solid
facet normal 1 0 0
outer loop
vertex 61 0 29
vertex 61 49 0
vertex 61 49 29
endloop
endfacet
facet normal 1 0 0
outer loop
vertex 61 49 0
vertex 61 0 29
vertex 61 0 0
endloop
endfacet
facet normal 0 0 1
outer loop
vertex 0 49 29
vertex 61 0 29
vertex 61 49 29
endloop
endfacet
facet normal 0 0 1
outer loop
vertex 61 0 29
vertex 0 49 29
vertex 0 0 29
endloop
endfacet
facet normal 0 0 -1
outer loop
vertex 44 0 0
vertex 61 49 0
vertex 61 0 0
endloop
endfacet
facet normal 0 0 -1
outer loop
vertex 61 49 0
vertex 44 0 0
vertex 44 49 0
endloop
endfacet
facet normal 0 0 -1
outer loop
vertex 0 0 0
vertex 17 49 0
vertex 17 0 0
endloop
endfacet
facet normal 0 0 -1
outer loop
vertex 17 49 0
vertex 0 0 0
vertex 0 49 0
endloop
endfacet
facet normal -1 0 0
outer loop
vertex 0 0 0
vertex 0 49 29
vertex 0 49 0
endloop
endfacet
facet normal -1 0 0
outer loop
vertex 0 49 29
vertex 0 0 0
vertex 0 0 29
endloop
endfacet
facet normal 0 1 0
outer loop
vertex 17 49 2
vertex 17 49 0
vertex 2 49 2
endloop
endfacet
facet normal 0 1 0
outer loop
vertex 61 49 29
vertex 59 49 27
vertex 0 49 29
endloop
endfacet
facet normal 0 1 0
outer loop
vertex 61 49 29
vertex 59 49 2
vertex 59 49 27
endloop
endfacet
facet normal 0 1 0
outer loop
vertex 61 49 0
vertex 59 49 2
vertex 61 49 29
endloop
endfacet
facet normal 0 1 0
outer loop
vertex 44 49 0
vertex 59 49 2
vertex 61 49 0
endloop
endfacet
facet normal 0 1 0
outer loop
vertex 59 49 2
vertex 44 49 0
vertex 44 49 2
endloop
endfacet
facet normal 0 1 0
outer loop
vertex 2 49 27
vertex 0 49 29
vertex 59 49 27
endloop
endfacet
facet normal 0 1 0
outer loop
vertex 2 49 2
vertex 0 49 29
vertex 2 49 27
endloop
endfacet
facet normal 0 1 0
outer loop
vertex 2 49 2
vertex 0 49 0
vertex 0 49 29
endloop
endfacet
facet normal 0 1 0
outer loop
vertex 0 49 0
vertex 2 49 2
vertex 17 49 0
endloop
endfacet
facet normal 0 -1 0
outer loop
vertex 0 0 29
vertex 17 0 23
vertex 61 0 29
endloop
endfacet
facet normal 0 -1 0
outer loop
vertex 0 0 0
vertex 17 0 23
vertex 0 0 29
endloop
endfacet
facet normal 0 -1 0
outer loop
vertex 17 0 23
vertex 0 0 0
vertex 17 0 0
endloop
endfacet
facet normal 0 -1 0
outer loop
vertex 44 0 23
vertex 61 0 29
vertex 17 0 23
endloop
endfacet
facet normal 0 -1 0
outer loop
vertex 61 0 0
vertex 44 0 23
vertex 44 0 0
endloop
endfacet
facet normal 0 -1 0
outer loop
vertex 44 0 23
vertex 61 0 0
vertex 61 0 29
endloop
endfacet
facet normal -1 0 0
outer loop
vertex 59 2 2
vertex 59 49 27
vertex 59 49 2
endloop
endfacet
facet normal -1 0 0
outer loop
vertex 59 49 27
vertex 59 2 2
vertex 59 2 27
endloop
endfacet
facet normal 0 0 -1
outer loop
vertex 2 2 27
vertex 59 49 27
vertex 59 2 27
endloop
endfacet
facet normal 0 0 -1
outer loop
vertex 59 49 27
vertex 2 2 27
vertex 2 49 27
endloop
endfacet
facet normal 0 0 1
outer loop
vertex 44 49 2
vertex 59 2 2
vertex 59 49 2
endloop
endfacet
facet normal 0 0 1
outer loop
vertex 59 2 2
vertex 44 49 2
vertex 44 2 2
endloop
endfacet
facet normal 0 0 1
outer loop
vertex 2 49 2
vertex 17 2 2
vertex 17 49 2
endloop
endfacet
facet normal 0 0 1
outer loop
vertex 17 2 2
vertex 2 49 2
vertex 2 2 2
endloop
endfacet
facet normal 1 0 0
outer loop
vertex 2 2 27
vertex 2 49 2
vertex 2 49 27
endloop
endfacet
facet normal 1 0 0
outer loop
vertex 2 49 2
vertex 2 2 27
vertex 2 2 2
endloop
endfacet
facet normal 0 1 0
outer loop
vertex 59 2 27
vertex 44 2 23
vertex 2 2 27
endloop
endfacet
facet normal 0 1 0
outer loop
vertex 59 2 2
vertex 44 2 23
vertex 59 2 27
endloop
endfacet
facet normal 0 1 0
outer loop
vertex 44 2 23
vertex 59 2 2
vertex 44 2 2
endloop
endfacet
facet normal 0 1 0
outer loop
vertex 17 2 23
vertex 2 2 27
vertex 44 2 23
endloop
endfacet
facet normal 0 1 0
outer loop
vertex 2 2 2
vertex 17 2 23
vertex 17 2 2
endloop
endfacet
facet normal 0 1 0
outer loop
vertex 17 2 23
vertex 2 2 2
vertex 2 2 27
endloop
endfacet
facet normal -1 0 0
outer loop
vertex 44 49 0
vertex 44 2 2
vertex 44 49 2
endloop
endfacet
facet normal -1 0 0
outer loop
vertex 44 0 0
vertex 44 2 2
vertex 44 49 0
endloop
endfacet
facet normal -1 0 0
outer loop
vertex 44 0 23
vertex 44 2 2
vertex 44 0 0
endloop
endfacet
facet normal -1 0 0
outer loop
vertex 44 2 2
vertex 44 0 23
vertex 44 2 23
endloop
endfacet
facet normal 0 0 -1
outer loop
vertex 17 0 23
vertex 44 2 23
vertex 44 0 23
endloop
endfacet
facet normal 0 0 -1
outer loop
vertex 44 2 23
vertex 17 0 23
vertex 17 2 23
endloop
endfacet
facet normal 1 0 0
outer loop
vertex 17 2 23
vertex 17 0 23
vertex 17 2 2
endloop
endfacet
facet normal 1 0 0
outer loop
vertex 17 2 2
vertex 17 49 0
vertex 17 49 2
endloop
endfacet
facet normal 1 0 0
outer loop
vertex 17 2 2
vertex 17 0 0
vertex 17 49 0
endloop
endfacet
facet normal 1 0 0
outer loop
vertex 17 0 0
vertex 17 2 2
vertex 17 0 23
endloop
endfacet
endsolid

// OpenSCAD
RemoteX=57;
RemoteY=45;
RemoteZ=25;
Wall=2;
Lip=15;
DW=Wall*2;
DL=Lip*2;
difference()
{
  cube([RemoteX+DW,RemoteY+DW,RemoteZ+DW]);
  translate([Wall,Wall,Wall]) cube([RemoteX,RemoteY+DW+DW,RemoteZ]);
  translate([Lip+Wall,-Wall,-Wall]) cube([RemoteX-DL,RemoteY+DW+DW,RemoteZ]);
}
